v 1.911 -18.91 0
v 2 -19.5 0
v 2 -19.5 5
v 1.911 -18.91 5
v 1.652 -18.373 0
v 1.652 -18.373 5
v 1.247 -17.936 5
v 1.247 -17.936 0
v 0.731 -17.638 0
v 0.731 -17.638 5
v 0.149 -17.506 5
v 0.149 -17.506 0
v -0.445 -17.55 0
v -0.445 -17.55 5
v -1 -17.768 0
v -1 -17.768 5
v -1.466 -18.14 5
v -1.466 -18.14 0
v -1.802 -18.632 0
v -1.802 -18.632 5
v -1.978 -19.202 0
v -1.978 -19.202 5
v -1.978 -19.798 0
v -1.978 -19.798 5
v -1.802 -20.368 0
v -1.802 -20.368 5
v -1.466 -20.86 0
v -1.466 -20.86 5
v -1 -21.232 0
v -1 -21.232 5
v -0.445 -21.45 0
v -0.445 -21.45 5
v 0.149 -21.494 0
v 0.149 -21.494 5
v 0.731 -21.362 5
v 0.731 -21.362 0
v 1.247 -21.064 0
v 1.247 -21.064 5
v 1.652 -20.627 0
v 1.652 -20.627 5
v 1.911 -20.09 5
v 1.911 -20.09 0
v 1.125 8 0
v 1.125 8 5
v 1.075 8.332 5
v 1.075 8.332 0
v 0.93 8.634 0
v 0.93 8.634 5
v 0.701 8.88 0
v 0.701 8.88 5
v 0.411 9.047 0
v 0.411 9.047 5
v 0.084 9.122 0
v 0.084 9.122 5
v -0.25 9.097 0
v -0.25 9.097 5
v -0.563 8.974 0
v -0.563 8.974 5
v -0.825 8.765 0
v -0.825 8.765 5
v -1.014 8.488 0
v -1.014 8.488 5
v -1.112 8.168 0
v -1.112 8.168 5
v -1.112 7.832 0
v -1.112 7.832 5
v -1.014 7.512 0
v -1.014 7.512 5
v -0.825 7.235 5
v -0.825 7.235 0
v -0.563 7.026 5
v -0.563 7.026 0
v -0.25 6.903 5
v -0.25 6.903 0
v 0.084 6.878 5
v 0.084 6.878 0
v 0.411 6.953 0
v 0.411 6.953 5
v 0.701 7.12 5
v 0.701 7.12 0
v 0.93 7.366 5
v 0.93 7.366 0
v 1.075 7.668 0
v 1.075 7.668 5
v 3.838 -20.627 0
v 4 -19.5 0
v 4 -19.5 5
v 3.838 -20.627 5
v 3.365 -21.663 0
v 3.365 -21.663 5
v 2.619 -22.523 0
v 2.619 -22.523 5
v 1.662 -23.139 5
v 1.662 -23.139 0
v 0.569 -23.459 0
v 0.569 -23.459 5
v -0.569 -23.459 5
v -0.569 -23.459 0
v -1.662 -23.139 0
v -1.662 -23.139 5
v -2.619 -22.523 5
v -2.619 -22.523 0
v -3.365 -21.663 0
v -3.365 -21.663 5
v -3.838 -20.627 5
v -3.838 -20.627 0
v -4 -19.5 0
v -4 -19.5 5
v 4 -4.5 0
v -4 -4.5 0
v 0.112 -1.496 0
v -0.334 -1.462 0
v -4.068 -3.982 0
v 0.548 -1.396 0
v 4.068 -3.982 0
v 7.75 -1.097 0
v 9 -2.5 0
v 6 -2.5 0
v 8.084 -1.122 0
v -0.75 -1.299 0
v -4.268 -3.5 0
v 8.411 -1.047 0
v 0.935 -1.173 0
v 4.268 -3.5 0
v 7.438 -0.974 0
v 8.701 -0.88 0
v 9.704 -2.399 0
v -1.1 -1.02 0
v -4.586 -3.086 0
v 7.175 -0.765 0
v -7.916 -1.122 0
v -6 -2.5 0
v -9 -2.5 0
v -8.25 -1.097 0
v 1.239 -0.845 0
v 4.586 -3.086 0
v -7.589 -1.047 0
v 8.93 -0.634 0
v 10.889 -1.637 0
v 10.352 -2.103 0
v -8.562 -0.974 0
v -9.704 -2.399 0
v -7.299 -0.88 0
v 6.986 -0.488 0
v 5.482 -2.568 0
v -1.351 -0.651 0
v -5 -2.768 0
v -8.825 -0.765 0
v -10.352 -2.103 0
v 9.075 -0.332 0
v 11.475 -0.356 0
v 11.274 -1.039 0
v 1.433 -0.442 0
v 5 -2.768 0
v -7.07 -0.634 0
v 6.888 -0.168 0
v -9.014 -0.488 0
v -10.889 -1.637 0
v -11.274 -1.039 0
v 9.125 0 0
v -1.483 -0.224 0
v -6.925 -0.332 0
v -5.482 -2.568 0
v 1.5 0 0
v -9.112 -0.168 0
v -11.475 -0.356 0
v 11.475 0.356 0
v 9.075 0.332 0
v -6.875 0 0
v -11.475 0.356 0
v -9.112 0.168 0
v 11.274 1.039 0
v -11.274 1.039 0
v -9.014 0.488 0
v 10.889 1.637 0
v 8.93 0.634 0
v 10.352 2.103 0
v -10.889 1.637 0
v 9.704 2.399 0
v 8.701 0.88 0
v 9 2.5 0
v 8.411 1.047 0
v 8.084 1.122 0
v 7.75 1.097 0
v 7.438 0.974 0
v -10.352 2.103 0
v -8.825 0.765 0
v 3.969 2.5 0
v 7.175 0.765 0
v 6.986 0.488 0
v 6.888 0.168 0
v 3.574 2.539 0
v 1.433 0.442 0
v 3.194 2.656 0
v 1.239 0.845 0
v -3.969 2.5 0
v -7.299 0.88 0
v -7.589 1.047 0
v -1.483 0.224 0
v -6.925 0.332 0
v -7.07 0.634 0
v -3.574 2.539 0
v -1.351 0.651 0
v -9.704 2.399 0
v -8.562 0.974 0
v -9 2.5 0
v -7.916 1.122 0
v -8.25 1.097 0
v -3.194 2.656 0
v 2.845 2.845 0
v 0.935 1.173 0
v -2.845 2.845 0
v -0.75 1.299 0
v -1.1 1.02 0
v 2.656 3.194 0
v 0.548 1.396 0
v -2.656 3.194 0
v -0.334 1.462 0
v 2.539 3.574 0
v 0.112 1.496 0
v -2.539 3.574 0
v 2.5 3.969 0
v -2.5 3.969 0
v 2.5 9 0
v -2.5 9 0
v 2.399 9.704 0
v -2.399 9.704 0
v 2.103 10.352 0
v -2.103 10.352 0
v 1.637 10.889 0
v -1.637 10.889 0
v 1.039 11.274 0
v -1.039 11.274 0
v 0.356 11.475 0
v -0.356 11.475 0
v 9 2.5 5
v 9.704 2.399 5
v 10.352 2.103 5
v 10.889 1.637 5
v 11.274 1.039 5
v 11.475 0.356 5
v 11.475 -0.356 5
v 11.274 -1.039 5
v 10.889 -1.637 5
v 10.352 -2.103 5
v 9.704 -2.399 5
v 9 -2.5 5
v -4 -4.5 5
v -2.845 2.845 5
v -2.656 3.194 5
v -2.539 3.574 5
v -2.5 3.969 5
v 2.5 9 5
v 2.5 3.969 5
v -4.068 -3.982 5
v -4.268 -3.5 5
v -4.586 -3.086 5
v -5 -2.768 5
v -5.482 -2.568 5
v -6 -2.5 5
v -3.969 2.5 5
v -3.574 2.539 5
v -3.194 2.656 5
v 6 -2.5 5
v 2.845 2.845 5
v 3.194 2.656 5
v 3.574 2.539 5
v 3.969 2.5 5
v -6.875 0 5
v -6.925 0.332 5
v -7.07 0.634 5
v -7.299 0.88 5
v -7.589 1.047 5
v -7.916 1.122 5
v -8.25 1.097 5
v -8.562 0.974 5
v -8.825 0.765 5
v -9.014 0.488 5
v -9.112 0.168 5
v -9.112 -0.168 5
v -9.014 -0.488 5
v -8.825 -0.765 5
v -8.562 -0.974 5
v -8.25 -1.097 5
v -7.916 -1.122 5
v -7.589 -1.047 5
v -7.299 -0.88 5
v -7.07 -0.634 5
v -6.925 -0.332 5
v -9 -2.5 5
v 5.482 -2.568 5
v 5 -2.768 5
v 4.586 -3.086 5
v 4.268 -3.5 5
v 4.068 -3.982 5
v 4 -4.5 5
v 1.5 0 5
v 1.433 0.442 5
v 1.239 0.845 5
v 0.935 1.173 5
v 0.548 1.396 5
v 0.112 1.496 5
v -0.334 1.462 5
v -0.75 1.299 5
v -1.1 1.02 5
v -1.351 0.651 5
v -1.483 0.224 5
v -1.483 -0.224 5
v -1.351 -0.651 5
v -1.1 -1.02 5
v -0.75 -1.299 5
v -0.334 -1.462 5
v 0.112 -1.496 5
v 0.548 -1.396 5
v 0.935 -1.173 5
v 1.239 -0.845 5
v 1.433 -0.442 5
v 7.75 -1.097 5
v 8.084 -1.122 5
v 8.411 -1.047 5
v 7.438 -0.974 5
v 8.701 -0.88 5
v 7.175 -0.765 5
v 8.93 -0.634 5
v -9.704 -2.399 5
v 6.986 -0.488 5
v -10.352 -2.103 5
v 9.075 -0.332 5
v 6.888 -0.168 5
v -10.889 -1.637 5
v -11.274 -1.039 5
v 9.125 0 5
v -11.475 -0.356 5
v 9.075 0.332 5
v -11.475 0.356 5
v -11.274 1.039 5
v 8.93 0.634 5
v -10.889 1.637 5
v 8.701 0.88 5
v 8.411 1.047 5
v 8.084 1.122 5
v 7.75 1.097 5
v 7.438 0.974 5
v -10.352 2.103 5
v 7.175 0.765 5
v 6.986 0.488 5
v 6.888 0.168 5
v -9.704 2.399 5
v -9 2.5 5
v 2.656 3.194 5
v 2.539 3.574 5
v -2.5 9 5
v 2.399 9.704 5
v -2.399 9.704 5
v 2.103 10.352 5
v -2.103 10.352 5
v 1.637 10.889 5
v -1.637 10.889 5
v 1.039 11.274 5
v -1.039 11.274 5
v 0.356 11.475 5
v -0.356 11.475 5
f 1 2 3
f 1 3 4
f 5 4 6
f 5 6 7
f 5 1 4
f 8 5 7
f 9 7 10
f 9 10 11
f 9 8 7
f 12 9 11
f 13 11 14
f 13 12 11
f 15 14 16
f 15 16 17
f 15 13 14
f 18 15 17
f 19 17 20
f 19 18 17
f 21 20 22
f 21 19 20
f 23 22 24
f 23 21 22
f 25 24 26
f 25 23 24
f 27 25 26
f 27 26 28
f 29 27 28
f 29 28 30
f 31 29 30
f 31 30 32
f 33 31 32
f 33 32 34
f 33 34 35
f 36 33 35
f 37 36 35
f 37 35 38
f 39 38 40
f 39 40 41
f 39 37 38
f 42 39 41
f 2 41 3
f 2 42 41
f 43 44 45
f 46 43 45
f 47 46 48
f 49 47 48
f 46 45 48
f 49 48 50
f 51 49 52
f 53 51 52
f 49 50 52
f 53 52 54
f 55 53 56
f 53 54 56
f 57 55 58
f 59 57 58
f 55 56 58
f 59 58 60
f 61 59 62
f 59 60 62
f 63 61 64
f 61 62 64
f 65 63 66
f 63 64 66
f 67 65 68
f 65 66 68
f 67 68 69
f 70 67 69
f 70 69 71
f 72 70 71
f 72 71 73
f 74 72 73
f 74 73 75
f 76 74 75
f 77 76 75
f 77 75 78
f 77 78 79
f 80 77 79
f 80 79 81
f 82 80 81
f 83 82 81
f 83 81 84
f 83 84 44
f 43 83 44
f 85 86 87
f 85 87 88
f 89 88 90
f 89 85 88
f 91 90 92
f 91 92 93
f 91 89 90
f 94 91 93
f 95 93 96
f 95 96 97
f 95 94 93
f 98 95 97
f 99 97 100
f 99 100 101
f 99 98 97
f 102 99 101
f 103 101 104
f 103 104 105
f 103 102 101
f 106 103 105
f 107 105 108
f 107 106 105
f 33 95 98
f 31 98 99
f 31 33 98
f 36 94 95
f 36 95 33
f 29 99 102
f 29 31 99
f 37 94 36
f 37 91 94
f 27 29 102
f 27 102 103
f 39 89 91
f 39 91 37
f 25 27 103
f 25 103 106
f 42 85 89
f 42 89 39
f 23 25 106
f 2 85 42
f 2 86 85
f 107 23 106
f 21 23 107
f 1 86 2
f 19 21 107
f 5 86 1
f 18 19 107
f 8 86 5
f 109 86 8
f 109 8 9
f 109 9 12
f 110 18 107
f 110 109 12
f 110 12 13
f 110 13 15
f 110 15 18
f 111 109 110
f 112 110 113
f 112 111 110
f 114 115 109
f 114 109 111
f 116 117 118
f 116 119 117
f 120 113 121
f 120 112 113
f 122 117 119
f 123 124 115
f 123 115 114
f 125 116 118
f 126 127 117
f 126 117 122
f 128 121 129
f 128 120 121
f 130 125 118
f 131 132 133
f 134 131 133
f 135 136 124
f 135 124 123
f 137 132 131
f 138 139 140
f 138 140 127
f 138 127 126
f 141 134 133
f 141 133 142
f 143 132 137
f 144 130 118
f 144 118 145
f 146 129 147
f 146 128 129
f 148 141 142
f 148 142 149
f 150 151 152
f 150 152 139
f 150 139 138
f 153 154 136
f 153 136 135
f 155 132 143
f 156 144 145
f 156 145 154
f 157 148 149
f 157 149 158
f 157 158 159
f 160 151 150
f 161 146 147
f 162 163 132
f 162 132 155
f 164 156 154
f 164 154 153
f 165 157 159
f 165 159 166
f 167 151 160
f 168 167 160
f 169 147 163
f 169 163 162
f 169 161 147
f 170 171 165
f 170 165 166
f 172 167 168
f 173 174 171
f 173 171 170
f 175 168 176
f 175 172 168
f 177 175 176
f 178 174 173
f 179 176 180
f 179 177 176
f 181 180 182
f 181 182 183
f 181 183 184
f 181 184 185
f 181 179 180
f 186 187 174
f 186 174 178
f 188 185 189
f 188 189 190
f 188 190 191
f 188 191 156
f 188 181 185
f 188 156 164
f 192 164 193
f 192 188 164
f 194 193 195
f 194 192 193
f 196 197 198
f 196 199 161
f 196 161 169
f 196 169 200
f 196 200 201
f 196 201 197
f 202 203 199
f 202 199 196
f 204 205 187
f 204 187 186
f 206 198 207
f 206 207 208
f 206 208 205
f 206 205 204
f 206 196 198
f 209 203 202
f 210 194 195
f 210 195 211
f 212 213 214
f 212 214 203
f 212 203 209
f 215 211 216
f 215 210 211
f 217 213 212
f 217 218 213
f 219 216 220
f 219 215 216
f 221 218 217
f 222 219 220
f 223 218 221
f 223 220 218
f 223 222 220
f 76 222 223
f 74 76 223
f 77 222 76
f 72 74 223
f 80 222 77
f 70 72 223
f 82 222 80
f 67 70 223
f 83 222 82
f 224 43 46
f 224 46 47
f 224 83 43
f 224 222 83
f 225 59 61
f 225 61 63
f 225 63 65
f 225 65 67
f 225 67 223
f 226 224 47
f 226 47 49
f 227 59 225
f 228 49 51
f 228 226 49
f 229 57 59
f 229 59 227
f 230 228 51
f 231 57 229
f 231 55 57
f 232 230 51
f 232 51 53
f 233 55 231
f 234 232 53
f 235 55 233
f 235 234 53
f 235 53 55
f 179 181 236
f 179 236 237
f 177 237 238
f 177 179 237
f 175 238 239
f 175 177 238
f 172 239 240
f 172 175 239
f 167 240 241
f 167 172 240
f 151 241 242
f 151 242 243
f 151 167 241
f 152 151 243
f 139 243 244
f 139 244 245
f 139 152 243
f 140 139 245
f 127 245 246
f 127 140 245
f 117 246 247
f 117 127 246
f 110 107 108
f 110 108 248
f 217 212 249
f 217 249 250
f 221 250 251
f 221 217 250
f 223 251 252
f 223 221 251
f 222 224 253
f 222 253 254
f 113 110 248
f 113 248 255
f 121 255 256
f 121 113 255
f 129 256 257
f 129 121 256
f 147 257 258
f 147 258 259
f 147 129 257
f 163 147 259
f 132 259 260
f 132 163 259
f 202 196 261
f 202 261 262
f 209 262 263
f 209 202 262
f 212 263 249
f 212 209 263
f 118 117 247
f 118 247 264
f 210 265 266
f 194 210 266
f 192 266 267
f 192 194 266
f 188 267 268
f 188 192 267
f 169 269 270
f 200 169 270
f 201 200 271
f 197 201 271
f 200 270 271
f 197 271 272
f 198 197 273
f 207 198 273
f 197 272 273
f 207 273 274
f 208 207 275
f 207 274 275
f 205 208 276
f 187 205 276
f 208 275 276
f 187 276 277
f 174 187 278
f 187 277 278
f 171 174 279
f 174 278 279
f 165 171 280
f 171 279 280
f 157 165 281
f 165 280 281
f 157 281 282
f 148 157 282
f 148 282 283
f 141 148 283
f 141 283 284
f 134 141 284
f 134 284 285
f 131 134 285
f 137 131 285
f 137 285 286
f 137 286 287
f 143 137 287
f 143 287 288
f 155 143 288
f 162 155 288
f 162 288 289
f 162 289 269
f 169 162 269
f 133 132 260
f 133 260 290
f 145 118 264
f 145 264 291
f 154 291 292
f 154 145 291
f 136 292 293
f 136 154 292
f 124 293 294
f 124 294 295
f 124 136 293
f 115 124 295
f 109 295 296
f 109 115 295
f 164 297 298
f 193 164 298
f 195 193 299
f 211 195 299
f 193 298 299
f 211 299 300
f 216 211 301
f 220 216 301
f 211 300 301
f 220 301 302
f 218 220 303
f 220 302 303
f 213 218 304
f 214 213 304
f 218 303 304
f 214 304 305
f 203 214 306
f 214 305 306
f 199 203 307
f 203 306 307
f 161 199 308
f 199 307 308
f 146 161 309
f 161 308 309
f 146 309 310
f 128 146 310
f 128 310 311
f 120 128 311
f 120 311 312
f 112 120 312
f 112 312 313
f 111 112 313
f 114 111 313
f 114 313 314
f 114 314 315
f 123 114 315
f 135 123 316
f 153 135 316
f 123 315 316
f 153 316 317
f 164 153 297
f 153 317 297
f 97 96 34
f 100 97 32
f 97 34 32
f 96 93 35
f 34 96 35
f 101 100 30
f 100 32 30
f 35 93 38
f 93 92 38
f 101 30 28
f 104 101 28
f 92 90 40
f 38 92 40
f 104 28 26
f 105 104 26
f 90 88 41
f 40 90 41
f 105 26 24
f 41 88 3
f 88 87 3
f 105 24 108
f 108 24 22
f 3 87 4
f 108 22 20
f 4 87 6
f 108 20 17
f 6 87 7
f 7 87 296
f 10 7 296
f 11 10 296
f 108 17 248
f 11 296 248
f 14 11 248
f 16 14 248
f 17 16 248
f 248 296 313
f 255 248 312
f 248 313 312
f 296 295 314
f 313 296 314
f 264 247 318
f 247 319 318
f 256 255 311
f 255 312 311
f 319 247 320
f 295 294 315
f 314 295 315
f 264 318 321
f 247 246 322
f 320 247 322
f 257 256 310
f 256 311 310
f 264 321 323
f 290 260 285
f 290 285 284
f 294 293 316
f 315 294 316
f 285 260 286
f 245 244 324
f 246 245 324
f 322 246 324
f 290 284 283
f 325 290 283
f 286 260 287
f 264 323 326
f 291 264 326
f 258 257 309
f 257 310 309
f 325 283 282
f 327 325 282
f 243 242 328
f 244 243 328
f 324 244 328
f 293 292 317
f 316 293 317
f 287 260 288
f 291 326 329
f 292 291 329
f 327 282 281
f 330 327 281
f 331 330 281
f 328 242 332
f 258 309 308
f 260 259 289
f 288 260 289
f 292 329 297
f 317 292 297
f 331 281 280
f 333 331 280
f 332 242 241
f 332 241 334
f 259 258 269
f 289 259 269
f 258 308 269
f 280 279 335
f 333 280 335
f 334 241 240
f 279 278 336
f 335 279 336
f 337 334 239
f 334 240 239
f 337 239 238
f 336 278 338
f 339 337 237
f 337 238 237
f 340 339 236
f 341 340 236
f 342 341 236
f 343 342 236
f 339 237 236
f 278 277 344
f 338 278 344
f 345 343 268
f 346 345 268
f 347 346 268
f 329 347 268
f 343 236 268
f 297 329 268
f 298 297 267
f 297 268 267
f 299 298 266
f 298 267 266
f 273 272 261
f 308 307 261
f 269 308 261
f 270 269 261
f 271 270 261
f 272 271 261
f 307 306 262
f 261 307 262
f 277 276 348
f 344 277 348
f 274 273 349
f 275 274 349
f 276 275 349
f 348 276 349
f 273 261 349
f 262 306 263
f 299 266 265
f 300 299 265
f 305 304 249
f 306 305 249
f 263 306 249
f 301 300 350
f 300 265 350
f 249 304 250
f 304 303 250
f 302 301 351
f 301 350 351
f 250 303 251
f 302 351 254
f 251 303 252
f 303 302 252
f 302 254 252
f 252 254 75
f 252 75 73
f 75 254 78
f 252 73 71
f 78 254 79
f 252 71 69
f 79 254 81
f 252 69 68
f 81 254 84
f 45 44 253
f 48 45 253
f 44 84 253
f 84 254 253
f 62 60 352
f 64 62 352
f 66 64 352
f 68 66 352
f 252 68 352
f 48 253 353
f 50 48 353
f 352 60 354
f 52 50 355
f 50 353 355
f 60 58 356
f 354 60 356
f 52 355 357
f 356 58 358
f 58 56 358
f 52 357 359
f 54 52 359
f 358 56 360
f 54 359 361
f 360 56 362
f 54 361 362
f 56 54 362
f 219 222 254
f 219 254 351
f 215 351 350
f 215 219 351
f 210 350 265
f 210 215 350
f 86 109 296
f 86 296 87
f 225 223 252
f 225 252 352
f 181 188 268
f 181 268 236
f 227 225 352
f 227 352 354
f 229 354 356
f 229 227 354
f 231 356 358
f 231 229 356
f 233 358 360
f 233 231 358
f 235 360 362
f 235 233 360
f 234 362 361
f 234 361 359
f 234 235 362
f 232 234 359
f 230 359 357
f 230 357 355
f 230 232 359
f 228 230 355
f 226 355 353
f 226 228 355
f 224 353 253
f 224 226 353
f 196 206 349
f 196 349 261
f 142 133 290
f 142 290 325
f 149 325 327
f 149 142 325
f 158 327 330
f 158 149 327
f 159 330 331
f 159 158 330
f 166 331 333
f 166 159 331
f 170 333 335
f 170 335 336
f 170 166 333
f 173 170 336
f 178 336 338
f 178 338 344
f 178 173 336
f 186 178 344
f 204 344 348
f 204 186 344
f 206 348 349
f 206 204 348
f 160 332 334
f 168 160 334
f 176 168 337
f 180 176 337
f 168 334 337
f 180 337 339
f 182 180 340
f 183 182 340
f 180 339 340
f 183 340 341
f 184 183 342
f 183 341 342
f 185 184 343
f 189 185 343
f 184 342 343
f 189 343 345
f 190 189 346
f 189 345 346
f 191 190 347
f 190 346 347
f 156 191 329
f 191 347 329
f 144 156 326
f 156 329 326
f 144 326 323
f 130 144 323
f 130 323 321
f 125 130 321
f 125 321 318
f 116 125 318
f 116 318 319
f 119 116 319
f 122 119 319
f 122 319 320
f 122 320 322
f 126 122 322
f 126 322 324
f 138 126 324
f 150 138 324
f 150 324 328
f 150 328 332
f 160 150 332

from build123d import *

# Parameters (mm, degrees)
ESQUISSE1_R             = 26.25
BOSS_EXTRU_1_DEPTH      = 5
ESQUISSE2_R             = 1.5
ENL_V_MAT_EXTRU_1_DEPTH = 5
ENL_V_START             = -5
ESQUISSE3_R             = 26.25
ESQUISSE3_R_2           = 2
ENL_V_MAT_EXTRU_2_DEPTH = 5
CONG_1_R                = 2
ESQUISSE4_R             = 1.125
ENL_V_MAT_EXTRU_3_DEPTH = 10


with BuildPart() as part:
    # Esquisse1 → Boss.-Extru.1 (new body)
    with BuildSketch(Plane.XY):
        Circle(ESQUISSE1_R)
    extrude(amount=BOSS_EXTRU_1_DEPTH)

    # Esquisse2 → Enlèv. mat.-Extru.1 (cut)
    with BuildSketch(Plane.XY.offset(5)):
        Circle(ESQUISSE2_R)
    extrude(amount=-ENL_V_MAT_EXTRU_1_DEPTH, mode=Mode.SUBTRACT)

    # Esquisse3 → Enlèv. mat.-Extru.2 (cut)
    # profile 1 of 2: a face of its own
    with BuildSketch(Plane.XY.offset(5).offset(ENL_V_START)):
        Circle(ESQUISSE3_R)
        with BuildLine():
            Line((9, -2.5), (4, -2.5))
            Line((4, -2.5), (4, -19.5))
            ThreePointArc((4, -19.5), (0, -23.5), (-4, -19.5))
            Line((-4, -19.5), (-4, -2.5))
            Line((-4, -2.5), (-9, -2.5))
            ThreePointArc((-9, -2.5), (-11.5, 0), (-9, 2.5))
            Line((-9, 2.5), (-3.122498999, 2.5))
            ThreePointArc((-3.122498999, 2.5), (-2.828427125, 2.828427125), (-2.5, 3.122498999))
            Line((-2.5, 3.122498999), (-2.5, 9))
            ThreePointArc((-2.5, 9), (0, 11.5), (2.5, 9))
            Line((2.5, 9), (2.5, 3.122498999))
            ThreePointArc((2.5, 3.122498999), (2.828427125, 2.828427125), (3.122498999, 2.5))
            Line((3.122498999, 2.5), (9, 2.5))
            ThreePointArc((9, 2.5), (11.5, 0), (9, -2.5))
        make_face(mode=Mode.SUBTRACT)
    # profile 2 of 2: a face of its own
    with BuildSketch(Plane.XY.offset(5).offset(ENL_V_START)):
        with Locations((0, -19.5)):
            Circle(ESQUISSE3_R_2)
    extrude(amount=ENL_V_MAT_EXTRU_2_DEPTH, mode=Mode.SUBTRACT)

    # Congé1
    # the kernel refuses this fillet: 2 mm, written as the material it adds along each edge
    with BuildSketch(Plane(origin=(-4, -2.5, 0), x_dir=(0, -1, 0), z_dir=(0, 0, 1)), Plane(origin=(4, -2.5, 0), x_dir=(1, 0, 0), z_dir=(0, 0, 1))) as cong_1_piece_1:
        with BuildLine():
            CenterArc((CONG_1_R, -CONG_1_R), CONG_1_R, 90, 90)
            Line((0, -CONG_1_R), (0, 0))
            Line((0, 0), (CONG_1_R, 0))
        make_face()
    extrude(amount=5)
    with BuildSketch(Plane(origin=(-3.122498999, 2.5, 0), x_dir=(-1, 0, 0), z_dir=(0, 0, 1))) as cong_1_piece_2:
        with BuildLine():
            CenterArc((0.846127967, -2), CONG_1_R, 90, 41.409622109)
            ThreePointArc((-0.476747688, -0.5), (-0.227558946, -0.260311955), (0, 0))
            Line((0, 0), (0.846127967, 0))
        make_face()
    extrude(amount=5)
    with BuildSketch(Plane(origin=(-2.5, 3.122498999, 0), x_dir=(-0.7237350132500174, -0.6900779887780779, 0), z_dir=(0, 0, 1)), Plane(origin=(3.122498999, 2.5, 0), x_dir=(-0.6900779887780603, 0.7237350132500343, 0), z_dir=(0, 0, 1))) as cong_1_piece_3:
        with BuildLine():
            CenterArc((0.863575741, -1.992528413), CONG_1_R, 94.954095219, 41.409622109)
            Line((-0.583894286, -0.612372436), (0, 0))
            ThreePointArc((0, 0), (0.345430296, -0.014943173), (0.690860592, 0))
        make_face()
    extrude(amount=5)
    with BuildSketch(Plane(origin=(2.5, 3.122498999, 0), x_dir=(0.7237350132500171, -0.6900779887780782, 0), z_dir=(0, 0, 1))) as cong_1_piece_4:
        with BuildLine():
            CenterArc((0.863575741, 1.992528413), CONG_1_R, 223.636282672, 41.409622109)
            Line((-0.583894286, 0.612372436), (0, 0))
            ThreePointArc((0, 0), (0.345430296, 0.014943173), (0.690860592, 0))
        make_face()
    extrude(amount=5)

    # Esquisse4 → Enlèv. mat.-Extru.3 (cut)
    with BuildSketch(Plane.XY.offset(5)):
        with Locations((-8, 0)):
            Circle(ESQUISSE4_R)
        with Locations((8, 0)):
            Circle(ESQUISSE4_R)
        with Locations((0, 8)):
            Circle(ESQUISSE4_R)
    extrude(amount=-ENL_V_MAT_EXTRU_3_DEPTH, mode=Mode.SUBTRACT)


solid = part.part
